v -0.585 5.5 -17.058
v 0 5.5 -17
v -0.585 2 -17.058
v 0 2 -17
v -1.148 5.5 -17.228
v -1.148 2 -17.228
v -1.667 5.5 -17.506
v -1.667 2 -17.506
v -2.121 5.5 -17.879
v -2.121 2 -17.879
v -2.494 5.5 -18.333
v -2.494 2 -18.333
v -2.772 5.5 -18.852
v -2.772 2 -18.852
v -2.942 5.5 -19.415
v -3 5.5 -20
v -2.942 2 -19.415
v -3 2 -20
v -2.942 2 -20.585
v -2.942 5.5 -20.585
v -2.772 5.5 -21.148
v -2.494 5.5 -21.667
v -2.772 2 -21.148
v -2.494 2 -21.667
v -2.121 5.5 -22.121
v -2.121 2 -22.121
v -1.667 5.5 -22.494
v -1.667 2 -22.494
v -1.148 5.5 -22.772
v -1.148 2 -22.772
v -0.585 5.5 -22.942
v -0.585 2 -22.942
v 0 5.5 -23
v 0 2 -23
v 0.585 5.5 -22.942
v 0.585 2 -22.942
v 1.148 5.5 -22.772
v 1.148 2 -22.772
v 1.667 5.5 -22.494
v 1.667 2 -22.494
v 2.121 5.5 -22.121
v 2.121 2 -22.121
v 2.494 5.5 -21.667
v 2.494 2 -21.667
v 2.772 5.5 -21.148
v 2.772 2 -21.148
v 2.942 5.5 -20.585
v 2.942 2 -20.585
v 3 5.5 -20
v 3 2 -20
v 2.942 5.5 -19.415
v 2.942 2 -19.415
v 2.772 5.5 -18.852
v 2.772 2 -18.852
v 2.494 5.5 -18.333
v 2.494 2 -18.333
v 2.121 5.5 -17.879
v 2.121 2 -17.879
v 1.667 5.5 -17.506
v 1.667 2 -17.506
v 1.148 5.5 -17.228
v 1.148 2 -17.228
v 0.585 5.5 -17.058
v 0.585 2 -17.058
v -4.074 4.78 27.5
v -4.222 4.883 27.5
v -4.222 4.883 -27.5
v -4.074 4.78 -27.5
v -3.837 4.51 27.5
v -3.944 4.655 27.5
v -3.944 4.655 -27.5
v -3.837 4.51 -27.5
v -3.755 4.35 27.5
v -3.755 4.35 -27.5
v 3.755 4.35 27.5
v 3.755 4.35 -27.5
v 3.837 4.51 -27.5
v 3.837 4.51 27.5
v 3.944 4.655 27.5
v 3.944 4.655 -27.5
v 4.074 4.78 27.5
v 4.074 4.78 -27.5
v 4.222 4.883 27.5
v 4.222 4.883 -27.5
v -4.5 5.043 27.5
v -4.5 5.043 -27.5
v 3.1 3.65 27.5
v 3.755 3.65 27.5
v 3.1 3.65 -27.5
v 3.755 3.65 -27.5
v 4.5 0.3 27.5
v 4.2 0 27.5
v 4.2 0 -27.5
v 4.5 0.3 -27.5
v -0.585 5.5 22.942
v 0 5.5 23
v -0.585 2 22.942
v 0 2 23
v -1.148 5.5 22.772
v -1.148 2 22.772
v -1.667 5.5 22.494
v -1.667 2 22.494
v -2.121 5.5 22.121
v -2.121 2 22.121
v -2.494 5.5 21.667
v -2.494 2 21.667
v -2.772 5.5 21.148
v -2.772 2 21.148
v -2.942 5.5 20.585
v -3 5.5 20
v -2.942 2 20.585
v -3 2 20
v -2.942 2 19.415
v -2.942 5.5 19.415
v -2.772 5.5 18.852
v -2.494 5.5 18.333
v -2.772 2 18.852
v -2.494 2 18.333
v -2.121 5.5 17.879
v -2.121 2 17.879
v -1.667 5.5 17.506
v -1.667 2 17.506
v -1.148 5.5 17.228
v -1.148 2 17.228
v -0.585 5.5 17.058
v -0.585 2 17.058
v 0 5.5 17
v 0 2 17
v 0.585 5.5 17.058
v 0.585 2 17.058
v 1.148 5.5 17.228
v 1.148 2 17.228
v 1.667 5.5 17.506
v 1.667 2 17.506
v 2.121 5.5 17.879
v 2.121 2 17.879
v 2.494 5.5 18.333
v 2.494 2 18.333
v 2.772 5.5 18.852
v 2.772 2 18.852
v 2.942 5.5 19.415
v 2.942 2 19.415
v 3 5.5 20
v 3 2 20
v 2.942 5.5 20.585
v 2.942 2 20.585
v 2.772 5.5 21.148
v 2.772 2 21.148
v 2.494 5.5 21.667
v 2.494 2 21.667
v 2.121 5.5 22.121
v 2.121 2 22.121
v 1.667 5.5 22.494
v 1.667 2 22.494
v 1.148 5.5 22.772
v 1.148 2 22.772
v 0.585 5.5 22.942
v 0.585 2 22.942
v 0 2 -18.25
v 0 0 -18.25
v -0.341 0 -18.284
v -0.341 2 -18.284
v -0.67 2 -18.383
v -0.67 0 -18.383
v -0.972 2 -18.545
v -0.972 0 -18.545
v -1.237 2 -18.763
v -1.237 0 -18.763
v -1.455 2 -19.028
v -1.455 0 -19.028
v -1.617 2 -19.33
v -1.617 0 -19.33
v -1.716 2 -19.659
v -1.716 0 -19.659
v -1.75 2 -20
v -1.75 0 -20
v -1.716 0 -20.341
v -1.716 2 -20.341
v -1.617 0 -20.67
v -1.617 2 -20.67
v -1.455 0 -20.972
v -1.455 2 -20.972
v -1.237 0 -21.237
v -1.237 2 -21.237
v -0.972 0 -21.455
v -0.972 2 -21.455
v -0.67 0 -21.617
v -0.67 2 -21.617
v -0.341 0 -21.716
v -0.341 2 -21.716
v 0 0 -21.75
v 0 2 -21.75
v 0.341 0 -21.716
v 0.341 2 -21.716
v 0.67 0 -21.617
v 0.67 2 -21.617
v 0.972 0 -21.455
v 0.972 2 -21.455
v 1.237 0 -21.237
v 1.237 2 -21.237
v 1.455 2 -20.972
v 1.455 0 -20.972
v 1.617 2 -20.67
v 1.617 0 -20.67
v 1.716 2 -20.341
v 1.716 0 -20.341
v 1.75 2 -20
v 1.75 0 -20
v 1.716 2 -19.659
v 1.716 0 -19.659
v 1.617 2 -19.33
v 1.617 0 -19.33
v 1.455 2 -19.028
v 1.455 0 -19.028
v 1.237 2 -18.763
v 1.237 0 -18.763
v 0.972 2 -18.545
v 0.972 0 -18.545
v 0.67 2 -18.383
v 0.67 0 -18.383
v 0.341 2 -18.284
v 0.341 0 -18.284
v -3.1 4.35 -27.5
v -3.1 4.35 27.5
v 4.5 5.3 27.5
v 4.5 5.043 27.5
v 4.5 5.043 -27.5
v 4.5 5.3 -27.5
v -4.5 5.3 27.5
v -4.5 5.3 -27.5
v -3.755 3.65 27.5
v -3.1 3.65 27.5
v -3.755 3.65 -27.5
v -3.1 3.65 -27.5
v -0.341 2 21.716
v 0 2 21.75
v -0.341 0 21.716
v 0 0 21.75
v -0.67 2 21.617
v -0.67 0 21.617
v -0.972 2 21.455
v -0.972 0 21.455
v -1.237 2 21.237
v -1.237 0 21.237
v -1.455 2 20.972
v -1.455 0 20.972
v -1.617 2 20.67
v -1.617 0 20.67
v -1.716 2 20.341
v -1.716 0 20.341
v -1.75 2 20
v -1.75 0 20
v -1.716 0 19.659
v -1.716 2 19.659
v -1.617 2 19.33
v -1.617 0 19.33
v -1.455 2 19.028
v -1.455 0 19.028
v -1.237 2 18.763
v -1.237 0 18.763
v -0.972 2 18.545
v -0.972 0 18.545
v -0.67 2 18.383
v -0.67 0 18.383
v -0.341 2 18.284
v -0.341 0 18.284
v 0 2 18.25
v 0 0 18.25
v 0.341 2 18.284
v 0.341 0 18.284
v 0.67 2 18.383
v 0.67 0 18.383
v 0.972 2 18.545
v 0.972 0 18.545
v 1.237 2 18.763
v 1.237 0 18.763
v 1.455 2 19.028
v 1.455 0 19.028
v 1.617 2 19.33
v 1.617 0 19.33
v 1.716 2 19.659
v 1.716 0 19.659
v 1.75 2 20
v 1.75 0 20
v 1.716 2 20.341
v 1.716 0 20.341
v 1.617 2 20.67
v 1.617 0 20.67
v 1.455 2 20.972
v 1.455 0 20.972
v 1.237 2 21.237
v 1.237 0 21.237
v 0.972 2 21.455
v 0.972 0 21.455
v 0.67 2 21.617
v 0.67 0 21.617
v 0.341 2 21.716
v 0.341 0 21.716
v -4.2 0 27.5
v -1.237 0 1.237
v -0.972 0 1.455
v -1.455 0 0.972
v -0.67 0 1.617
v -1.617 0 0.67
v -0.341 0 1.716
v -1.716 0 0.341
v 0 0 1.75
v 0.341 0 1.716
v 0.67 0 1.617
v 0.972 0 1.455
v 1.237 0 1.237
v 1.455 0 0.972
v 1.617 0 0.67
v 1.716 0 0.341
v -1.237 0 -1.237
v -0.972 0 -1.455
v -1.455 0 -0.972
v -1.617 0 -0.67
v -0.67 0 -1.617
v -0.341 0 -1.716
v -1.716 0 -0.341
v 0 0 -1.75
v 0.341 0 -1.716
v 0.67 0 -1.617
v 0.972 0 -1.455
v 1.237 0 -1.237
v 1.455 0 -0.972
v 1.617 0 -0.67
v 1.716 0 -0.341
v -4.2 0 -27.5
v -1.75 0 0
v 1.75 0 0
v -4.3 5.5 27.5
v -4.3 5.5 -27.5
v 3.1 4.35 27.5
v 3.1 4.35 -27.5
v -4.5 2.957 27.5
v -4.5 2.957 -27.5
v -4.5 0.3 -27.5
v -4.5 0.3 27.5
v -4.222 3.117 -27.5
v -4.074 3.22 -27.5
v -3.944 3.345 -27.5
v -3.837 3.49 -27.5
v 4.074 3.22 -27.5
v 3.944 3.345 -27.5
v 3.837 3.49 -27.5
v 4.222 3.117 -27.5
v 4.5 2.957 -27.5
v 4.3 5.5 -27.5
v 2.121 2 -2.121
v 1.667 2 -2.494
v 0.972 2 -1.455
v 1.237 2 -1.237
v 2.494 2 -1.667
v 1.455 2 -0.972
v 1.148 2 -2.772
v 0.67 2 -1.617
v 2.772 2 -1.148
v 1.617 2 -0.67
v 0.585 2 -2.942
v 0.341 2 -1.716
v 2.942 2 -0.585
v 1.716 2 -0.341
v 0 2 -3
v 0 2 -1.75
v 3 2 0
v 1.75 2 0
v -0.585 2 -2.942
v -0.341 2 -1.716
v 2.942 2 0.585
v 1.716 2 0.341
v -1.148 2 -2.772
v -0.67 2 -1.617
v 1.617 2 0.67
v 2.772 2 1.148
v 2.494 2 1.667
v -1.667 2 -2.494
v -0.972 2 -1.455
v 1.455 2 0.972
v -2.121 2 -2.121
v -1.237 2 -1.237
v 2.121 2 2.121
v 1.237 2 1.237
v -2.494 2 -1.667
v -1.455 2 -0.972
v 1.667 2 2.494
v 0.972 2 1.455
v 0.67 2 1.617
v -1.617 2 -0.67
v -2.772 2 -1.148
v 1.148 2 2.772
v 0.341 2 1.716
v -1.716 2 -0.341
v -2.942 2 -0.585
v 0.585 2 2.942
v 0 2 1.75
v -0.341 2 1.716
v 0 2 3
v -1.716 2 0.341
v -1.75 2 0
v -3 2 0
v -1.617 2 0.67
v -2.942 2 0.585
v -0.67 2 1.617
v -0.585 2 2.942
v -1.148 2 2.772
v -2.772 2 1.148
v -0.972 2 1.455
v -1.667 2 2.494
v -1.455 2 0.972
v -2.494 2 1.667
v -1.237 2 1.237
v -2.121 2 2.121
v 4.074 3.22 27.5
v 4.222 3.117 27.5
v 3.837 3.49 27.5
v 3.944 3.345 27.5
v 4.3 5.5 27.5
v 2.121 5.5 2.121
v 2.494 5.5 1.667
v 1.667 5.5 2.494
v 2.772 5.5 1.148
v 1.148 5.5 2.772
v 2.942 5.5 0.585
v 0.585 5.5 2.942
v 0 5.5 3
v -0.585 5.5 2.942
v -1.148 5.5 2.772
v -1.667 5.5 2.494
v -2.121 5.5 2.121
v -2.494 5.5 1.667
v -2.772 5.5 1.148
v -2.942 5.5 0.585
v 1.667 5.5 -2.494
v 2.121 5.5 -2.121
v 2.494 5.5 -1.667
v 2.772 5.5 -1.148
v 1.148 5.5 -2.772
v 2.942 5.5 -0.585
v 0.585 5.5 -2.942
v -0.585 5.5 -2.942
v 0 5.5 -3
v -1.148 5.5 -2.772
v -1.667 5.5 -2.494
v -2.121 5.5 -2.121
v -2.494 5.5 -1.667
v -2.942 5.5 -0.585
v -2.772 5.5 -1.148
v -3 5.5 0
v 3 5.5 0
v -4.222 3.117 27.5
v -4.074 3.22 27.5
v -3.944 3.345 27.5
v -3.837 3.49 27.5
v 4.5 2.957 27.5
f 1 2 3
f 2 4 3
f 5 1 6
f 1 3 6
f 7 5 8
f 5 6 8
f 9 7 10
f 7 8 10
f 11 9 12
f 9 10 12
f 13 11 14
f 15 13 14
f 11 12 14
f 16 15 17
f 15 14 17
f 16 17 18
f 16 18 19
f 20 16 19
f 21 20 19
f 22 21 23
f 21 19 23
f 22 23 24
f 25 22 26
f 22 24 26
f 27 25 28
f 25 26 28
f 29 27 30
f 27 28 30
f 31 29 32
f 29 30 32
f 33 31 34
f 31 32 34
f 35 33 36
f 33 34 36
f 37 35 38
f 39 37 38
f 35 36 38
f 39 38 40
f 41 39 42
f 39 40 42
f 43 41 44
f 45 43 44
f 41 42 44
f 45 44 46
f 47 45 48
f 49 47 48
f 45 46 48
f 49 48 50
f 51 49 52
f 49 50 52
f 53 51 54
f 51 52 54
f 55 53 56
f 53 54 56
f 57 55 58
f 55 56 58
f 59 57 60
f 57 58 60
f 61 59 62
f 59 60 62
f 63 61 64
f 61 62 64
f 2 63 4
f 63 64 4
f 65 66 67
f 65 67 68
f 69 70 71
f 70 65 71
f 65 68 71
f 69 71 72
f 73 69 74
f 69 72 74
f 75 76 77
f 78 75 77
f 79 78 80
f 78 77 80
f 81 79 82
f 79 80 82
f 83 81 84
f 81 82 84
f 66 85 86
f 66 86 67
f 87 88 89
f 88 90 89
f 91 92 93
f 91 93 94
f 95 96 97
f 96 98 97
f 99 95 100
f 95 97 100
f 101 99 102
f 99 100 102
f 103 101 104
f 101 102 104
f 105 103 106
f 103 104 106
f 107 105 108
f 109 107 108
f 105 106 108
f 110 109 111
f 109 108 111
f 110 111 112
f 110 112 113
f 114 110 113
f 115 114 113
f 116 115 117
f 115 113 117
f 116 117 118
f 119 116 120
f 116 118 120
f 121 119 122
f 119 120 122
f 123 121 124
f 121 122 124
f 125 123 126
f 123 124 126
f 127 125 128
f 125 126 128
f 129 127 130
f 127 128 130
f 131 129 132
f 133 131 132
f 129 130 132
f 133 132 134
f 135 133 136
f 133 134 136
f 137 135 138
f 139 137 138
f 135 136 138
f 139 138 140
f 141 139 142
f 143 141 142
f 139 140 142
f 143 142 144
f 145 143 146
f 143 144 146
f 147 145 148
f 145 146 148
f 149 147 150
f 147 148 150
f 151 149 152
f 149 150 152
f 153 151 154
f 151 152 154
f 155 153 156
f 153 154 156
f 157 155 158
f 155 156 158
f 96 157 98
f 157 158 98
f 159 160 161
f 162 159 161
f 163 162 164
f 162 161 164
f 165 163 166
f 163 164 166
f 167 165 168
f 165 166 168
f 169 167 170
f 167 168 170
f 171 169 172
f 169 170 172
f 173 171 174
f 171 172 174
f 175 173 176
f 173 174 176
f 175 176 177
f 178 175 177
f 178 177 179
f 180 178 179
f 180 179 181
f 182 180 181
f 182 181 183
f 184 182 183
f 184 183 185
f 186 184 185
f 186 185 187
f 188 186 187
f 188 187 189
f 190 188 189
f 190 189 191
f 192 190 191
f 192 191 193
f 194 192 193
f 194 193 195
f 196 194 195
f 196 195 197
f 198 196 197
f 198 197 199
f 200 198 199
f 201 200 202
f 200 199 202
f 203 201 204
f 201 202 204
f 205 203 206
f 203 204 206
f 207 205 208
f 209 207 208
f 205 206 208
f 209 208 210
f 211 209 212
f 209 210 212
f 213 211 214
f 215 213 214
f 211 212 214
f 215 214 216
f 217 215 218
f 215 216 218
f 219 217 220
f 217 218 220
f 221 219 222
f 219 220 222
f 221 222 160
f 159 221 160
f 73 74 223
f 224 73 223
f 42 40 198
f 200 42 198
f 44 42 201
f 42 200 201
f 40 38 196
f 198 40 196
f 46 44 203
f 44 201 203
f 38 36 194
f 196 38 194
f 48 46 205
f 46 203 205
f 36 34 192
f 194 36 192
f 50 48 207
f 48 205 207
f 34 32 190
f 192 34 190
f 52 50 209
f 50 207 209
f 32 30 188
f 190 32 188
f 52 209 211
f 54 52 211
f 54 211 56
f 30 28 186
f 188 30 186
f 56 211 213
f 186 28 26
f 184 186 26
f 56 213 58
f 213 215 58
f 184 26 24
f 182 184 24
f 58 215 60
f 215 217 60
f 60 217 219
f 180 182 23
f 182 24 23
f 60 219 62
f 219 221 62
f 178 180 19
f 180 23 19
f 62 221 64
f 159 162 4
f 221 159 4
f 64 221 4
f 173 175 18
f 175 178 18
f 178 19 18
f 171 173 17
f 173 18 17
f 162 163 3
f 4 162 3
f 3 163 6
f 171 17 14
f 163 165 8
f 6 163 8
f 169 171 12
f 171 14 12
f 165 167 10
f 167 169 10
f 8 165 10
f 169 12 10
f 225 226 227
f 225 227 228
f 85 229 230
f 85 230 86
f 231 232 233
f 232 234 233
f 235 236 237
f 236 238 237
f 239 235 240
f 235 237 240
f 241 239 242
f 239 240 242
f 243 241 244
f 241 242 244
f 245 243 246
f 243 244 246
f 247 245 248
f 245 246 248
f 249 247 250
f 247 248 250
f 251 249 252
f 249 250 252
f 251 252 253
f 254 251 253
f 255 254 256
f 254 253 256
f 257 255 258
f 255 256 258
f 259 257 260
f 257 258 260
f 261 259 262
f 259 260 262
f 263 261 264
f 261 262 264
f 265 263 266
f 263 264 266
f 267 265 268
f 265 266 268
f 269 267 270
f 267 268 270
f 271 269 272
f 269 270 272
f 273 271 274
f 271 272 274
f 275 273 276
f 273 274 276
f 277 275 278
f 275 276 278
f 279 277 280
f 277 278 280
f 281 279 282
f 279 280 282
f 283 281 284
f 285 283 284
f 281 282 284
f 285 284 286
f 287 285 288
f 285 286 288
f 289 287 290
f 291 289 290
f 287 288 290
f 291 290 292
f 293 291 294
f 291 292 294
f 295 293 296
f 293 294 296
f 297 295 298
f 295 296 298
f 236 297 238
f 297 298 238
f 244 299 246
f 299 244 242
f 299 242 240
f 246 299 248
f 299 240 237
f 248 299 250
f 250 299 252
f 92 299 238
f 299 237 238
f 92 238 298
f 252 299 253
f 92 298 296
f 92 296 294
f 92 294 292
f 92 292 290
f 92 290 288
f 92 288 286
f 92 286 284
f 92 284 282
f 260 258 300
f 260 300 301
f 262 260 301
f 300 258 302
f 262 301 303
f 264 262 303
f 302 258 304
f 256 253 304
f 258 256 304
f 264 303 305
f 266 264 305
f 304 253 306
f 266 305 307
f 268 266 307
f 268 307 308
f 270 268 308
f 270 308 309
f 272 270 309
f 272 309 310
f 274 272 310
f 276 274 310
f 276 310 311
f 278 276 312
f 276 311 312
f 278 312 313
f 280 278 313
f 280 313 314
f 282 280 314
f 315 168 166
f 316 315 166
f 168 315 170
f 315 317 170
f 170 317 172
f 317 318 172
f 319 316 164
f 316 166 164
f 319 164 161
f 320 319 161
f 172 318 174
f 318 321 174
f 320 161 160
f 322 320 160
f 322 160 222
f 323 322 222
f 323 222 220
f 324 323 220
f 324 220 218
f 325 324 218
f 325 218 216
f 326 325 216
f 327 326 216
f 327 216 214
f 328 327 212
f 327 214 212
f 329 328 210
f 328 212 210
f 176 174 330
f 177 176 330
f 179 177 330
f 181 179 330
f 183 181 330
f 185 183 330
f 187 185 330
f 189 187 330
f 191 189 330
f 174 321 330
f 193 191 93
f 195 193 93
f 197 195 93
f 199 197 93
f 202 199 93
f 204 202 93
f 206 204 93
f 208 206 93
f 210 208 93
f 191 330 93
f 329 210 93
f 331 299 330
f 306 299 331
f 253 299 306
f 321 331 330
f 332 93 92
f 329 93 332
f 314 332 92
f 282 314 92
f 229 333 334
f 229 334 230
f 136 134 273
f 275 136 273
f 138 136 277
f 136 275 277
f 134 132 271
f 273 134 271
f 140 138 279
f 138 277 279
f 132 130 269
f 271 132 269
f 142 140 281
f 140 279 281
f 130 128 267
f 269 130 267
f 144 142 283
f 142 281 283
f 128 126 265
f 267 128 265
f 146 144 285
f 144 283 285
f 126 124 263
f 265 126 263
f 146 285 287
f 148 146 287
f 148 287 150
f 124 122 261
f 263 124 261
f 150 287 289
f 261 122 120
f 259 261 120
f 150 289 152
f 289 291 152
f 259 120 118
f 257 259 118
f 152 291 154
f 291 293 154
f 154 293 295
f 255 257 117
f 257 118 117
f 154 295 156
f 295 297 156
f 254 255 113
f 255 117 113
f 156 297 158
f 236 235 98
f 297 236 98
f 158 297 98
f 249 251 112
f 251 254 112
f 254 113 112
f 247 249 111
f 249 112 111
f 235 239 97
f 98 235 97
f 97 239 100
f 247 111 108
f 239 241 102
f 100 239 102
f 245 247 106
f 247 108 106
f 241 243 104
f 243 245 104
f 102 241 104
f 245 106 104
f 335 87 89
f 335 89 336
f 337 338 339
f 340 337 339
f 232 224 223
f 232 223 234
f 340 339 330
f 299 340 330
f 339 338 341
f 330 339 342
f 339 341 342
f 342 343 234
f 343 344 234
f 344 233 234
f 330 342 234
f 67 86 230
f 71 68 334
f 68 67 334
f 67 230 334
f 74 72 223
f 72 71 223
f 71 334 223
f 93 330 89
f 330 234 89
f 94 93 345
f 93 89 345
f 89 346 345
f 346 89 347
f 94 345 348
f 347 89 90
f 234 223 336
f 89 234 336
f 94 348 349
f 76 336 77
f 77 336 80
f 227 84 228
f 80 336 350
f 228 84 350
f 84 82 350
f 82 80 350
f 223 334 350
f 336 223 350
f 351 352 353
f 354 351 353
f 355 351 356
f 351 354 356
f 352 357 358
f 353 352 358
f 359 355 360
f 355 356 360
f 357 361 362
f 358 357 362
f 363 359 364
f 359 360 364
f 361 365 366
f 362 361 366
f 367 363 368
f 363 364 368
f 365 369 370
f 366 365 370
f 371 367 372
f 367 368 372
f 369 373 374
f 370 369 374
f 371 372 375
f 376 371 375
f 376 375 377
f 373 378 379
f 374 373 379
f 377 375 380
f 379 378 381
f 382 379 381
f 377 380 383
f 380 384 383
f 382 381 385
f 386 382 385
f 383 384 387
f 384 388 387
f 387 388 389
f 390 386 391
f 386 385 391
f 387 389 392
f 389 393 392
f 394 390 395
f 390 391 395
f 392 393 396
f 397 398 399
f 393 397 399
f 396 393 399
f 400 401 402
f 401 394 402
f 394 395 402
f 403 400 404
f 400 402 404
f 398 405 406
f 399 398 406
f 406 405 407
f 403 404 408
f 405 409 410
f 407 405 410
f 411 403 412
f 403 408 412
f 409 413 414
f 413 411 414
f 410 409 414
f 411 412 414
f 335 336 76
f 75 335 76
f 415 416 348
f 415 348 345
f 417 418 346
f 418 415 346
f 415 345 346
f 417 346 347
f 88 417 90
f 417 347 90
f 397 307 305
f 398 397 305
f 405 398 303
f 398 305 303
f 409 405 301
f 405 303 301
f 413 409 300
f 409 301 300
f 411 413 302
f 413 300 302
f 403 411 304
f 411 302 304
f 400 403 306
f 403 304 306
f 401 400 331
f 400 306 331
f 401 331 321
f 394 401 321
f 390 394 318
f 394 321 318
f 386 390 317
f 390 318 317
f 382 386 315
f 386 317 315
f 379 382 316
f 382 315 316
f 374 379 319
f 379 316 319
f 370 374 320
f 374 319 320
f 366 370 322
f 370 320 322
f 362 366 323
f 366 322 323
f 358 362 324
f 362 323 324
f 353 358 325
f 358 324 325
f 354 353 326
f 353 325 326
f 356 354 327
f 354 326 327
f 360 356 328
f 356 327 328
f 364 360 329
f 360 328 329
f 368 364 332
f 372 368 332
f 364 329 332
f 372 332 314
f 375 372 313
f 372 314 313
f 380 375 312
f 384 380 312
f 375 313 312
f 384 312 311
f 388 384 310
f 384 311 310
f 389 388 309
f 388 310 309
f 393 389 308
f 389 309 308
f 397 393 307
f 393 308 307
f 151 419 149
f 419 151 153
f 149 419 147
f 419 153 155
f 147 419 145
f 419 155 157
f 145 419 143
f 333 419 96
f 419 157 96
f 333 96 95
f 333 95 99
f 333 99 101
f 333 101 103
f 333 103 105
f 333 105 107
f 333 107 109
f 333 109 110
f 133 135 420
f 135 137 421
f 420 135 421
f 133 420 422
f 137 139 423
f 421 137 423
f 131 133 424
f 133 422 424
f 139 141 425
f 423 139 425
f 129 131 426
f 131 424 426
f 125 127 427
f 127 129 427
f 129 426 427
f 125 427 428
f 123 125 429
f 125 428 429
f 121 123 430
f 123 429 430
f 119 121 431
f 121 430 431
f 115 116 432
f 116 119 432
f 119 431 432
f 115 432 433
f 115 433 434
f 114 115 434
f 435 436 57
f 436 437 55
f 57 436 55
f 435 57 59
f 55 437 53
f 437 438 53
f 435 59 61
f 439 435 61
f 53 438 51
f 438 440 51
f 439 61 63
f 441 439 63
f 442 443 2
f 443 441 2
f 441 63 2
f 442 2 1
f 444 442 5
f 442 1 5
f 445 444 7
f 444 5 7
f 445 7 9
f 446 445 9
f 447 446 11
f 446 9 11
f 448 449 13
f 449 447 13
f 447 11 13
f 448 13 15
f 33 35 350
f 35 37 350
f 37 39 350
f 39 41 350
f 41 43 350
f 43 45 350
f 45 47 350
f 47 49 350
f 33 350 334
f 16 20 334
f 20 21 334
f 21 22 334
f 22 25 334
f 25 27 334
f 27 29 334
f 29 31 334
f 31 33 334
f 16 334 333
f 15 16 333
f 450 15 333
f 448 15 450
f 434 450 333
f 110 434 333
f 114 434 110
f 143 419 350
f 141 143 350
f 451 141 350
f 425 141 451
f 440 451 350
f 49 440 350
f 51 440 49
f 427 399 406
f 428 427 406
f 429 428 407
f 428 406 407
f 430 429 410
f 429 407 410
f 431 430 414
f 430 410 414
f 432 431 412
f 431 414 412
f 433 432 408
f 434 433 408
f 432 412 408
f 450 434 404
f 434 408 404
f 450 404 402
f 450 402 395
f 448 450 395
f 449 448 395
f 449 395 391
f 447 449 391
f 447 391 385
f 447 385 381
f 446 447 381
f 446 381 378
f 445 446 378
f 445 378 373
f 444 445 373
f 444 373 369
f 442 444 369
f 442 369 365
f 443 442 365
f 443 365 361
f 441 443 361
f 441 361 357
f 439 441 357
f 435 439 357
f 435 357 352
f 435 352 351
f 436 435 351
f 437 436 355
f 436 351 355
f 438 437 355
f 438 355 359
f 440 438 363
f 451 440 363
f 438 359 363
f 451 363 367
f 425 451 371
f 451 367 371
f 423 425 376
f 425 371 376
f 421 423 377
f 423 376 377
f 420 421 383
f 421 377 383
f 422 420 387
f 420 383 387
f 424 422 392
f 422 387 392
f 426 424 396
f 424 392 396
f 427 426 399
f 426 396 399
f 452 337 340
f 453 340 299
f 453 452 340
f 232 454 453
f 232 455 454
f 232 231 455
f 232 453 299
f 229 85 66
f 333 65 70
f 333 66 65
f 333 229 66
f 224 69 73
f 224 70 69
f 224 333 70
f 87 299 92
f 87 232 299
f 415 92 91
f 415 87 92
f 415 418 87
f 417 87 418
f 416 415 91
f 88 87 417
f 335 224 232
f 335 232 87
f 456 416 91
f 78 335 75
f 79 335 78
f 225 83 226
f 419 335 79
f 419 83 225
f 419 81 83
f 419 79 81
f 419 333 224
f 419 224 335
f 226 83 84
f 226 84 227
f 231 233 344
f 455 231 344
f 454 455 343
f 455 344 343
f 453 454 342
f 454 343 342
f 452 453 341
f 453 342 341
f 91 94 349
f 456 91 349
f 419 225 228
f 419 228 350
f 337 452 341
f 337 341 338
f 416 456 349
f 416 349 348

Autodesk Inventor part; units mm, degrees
sketch "Sketch_12" plane through (0, 0, 0) normal (0, 0, 1) x (1, 0, 0)
  line L0 (-4.5, 5.3) -> (-4.5, 5.0434)
  line L1 (-4.5, 5.0434) -> (-4.2216, 4.8827)
  arc A0 (-3.7548, 4.35) -> (-4.2216, 4.8827) centre (-4.7715, 3.93) ccw
  line L2 (-3.7548, 4.35) -> (-3.1, 4.35)
  line L3 (-3.1, 4.35) -> (-3.1, 3.65)
  line L4 (-3.1, 3.65) -> (-3.7548, 3.65)
  arc A1 (-4.2216, 3.1173) -> (-3.7548, 3.65) centre (-4.7715, 4.07) ccw
  line L5 (-4.2216, 3.1173) -> (-4.5, 2.9566)
  line L6 (-4.5, 2.9566) -> (-4.5, 0.3)
  line L7 (-4.5, 0.3) -> (-4.2, 0)
  line L8 (-4.2, 0) -> (4.2, 0)
  line L9 (4.2, 0) -> (4.5, 0.3)
  line L10 (4.5, 0.3) -> (4.5, 2.9566)
  line L11 (4.5, 2.9566) -> (4.2216, 3.1173)
  arc A2 (3.7548, 3.65) -> (4.2216, 3.1173) centre (4.7715, 4.07) ccw
  line L12 (3.7548, 3.65) -> (3.1, 3.65)
  line L13 (3.1, 3.65) -> (3.1, 4.35)
  line L14 (3.1, 4.35) -> (3.7548, 4.35)
  arc A3 (4.2216, 4.8827) -> (3.7548, 4.35) centre (4.7715, 3.93) ccw
  line L15 (4.2216, 4.8827) -> (4.5, 5.0434)
  line L16 (4.5, 5.0434) -> (4.5, 5.3)
  line L17 (4.5, 5.3) -> (4.3, 5.5)
  line L18 (4.3, 5.5) -> (-4.3, 5.5)
  line L19 (-4.3, 5.5) -> (-4.5, 5.3)
extrude "Extrusion1" add sketch "Sketch_12" along normal mid plane 55
sketch "Sketch2" plane through (-4.3, 5.5, 27.5) normal (0, 1, 0) x (1, 0, 0)
  point P0 (4.3, 47.5)
hole "Hole1" at (0, 5.5, -20) direction (0, -1, 0) diameter 3.5 depth 5.5 counterbore diameter 6 counterbore depth 3.5
pattern_linear "Rectangular Pattern1" count 3 spacing 20 along (0, 0, 1) of "Hole1"
ref_plane "to_block_XY" through (0, 5.5, 0) normal (0, 0, 1) x (1, 0, 0)
ref_plane "to_block_YZ" through (0, 5.5, 0) normal (1, 0, 0) x (0, 1, 0)
ref_plane "to_block_ZX" through (0, 5.5, 0) normal (0, 1, 0) x (0, 0, 1)
properties part number "SSEBZ-MX10-55_r"
